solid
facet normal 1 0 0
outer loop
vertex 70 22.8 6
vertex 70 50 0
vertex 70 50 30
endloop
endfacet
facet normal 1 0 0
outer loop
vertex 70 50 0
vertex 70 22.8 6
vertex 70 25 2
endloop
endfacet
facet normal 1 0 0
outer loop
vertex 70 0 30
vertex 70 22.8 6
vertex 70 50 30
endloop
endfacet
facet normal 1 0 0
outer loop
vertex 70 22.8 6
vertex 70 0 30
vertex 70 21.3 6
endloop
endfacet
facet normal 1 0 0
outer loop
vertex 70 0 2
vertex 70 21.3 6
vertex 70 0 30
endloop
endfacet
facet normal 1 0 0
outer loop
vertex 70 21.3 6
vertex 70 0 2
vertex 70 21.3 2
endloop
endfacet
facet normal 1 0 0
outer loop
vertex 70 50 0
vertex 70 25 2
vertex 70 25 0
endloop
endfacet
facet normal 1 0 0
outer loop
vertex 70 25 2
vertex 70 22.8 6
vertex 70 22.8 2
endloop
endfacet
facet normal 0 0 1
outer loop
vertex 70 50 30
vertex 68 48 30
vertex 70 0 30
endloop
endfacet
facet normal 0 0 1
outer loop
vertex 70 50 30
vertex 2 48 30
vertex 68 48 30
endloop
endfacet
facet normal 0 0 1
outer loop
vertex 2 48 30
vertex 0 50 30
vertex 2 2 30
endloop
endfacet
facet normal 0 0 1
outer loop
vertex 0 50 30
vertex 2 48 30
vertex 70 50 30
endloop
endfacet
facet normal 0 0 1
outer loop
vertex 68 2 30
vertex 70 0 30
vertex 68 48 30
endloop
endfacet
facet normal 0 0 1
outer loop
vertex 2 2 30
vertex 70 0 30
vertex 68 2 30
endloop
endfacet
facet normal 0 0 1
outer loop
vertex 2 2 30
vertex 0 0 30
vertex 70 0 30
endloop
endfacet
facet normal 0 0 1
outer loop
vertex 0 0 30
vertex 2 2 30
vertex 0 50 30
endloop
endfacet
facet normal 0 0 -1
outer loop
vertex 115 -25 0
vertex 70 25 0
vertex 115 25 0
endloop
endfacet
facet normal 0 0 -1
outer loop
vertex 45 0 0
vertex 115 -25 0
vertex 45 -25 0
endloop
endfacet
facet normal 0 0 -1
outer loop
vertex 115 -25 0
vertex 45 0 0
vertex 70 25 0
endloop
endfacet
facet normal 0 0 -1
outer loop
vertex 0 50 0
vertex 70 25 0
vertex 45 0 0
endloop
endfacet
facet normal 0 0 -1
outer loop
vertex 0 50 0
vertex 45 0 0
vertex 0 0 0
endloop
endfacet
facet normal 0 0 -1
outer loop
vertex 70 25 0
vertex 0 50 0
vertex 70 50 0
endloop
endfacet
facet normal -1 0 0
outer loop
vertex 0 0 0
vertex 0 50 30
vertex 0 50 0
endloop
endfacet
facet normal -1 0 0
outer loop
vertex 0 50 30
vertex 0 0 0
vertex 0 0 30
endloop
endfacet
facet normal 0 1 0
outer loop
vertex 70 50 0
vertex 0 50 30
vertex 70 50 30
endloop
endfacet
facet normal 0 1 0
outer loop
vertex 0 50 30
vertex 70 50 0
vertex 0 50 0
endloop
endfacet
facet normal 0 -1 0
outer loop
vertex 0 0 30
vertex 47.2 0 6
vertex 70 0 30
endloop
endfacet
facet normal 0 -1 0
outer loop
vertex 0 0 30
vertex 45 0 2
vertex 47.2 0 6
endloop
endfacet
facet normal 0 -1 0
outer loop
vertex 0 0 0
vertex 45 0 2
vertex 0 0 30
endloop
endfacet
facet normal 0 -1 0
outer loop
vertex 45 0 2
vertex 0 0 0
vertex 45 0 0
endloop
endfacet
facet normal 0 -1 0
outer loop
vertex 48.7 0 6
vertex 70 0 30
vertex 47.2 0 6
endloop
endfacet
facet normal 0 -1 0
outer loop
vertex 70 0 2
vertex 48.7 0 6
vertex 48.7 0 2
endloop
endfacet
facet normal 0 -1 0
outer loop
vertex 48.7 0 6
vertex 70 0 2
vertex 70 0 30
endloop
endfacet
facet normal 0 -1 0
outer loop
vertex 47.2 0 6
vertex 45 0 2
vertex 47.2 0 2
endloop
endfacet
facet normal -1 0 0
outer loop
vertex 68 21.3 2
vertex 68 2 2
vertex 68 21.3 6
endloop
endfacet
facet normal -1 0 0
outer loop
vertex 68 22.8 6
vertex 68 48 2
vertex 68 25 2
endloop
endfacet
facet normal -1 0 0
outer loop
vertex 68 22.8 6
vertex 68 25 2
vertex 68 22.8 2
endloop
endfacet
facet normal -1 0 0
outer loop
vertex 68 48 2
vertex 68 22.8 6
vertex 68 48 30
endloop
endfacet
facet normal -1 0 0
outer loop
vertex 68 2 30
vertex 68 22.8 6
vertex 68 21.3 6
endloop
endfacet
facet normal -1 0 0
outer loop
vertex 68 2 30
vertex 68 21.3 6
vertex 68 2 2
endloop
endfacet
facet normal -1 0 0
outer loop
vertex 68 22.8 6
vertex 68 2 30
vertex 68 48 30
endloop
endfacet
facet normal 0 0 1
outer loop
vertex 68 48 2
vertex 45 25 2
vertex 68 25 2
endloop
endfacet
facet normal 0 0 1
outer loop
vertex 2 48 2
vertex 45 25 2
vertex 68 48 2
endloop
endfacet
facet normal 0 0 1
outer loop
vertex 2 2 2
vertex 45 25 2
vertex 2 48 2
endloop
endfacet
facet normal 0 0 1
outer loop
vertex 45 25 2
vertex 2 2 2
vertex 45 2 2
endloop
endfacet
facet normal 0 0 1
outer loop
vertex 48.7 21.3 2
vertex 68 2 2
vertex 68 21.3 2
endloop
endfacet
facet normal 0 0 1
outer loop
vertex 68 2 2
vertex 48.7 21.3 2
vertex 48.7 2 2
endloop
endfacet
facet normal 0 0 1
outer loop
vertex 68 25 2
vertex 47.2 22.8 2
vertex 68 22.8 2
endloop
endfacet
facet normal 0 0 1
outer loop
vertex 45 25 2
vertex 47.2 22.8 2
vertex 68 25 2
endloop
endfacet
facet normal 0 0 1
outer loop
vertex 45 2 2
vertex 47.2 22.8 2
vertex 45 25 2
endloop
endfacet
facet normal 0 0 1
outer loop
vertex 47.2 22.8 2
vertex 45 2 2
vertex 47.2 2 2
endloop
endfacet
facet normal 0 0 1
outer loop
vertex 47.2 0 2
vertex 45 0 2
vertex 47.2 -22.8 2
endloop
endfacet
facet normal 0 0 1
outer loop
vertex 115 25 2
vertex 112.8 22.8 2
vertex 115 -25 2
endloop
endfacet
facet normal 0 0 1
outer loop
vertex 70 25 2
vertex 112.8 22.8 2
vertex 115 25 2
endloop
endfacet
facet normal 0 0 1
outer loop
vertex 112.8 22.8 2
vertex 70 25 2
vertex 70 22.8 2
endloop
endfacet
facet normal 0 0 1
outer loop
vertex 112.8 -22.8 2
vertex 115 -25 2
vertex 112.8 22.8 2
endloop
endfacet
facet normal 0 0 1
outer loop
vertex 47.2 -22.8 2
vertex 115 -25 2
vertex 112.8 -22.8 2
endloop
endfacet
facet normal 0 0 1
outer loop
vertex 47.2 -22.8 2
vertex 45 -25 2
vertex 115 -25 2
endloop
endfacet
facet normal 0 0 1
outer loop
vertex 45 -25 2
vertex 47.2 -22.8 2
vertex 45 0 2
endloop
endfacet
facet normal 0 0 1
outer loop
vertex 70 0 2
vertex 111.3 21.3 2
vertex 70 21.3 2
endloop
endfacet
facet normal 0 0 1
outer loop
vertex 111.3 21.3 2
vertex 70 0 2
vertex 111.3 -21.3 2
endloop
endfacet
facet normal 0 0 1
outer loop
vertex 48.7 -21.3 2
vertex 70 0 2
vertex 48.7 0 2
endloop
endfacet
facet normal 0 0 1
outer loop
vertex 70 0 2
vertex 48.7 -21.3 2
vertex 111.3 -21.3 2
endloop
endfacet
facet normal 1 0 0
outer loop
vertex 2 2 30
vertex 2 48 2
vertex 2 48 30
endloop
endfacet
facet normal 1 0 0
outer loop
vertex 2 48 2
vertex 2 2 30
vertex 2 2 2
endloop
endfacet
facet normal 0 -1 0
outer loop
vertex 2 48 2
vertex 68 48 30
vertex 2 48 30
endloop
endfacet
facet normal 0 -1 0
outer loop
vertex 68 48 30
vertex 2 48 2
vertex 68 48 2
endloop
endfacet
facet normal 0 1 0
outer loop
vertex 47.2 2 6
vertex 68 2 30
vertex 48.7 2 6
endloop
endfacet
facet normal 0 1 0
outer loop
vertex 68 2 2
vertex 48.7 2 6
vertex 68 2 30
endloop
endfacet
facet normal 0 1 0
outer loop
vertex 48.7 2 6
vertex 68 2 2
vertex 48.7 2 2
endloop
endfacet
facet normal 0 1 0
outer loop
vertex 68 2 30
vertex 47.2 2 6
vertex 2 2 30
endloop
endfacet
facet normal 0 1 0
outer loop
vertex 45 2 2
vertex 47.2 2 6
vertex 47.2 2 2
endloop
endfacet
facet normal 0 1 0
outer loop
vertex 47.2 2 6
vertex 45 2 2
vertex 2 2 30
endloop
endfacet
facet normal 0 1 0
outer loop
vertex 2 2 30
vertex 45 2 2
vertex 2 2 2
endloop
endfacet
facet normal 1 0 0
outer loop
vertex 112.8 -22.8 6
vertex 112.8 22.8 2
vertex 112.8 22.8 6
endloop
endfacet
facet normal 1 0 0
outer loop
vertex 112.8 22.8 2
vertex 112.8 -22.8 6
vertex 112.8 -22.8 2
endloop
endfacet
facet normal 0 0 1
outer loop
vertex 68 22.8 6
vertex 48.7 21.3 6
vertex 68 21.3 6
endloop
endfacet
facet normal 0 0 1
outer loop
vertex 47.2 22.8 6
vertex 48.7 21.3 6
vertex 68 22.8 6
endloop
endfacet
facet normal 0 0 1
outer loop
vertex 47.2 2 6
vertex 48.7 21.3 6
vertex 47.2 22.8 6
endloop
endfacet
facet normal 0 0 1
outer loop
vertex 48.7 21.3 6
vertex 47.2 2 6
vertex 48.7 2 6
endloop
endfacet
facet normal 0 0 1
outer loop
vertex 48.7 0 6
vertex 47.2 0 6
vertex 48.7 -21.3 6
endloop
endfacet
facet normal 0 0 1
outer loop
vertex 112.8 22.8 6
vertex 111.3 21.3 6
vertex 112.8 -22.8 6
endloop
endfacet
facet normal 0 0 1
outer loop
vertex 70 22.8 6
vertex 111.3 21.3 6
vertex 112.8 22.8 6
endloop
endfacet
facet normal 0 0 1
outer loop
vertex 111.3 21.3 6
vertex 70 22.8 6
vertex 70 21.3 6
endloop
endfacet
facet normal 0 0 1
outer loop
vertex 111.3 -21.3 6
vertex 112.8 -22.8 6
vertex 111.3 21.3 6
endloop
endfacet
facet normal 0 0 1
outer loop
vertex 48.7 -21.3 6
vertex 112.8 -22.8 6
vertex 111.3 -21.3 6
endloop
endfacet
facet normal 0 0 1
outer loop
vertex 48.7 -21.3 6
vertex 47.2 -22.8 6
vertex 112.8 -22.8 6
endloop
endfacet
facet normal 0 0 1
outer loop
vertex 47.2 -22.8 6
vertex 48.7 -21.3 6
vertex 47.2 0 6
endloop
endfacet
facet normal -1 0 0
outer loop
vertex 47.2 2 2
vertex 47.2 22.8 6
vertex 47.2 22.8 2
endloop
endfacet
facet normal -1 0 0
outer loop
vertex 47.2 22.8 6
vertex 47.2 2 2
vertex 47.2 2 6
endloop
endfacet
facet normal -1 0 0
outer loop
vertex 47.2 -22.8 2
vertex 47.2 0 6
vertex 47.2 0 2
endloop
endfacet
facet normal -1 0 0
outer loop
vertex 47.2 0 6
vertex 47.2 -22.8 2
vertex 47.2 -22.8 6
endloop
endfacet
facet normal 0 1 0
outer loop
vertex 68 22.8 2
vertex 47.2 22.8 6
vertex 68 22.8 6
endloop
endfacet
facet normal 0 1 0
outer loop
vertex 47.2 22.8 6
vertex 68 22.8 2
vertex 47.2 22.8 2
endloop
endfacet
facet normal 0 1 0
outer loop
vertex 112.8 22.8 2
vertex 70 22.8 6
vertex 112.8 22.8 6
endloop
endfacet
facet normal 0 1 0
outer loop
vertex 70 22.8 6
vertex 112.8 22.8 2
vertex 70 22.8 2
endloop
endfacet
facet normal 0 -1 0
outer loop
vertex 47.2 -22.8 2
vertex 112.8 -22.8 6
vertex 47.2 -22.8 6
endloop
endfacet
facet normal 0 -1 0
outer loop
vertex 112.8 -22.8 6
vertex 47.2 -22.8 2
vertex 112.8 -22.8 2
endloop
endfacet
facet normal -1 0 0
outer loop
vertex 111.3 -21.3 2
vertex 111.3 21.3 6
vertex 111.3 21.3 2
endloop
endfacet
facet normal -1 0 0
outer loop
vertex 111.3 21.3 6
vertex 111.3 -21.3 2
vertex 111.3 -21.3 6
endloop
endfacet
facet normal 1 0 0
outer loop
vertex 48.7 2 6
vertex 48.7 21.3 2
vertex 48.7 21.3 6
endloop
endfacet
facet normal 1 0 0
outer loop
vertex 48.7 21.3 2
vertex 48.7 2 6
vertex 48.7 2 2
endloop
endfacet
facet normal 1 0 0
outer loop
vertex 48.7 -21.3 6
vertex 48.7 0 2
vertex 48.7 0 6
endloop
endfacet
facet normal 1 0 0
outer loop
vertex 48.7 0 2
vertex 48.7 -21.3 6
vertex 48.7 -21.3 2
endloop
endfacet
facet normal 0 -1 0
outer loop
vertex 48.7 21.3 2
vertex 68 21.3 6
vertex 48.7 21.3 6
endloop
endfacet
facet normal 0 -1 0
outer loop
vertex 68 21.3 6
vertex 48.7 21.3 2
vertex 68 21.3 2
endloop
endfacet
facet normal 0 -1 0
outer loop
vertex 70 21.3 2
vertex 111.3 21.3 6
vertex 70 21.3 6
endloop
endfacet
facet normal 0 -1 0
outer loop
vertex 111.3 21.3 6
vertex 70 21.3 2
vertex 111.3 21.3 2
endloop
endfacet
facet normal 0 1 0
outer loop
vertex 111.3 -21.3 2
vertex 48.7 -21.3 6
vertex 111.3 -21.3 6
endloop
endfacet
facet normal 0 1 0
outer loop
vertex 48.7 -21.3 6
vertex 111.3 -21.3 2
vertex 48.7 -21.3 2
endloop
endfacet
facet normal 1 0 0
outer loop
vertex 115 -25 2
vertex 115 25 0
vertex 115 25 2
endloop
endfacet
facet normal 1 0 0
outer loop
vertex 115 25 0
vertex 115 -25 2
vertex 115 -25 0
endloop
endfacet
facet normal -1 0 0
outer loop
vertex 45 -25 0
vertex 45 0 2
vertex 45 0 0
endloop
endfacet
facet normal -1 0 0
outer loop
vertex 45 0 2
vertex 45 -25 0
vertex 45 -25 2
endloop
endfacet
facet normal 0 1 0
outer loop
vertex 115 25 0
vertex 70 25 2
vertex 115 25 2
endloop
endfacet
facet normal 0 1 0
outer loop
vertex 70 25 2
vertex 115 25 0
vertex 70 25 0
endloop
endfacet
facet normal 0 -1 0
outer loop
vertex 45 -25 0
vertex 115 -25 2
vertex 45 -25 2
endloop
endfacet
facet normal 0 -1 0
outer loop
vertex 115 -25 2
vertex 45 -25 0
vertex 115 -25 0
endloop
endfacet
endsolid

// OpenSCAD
// Dimensions
// Box outer dimensions
BOX_W = 70;
BOX_D = 50;
BOX_H = 30;

// Box wall and floor thickness
BOX_WALL = 2;
BOX_FLOOR = 2;

// Lid plate dimensions
LID_W = 70;
LID_D = 50;
LID_THICK = 2;

// Lid lip dimensions
LIP_THICK = 1.5;
LIP_H = 4;
LIP_W = 65.6;
LIP_D = 45.6;

// Gap between parts on the print bed
PART_GAP = 10;

// Calculated Inner Dimensions for Box
// Inner width/depth is outer minus 2*wall
BOX_INNER_W = BOX_W - 2 * BOX_WALL;
BOX_INNER_D = BOX_D - 2 * BOX_WALL;
// Inner height is outer minus floor (since top is open)
BOX_INNER_H = BOX_H - BOX_FLOOR;

// Calculated Inner Dimensions for Lip
// Inner width/depth is outer minus 2*wall thickness
LIP_INNER_W = LIP_W - 2 * LIP_THICK;
LIP_INNER_D = LIP_D - 2 * LIP_THICK;

// Positioning
// Box is centered at X=0, Y=0.
// Lid is placed on the +X side with a 10 mm gap.
// Box extends from X = -35 to 35.
// Lid starts at X = 35 + 10 = 45.
// Lid width is 70, so it extends from 45 to 115.
// Center of lid in X: 45 + 35 = 80.
// Both are centered in Y.

// --- Part 1: The Box ---
// Built in print orientation: rests on XY plane, builds upward +Z.
// Open top.
module Box() {
    // We build the box as a solid block and subtract the inner volume.
    // This ensures the floor and walls are solid.
    
    // Outer shell
    difference() {
        // Solid block
        cube([BOX_W, BOX_D, BOX_H], center = false);
        
        // Inner cavity (subtractive)
        // The cavity starts at z = BOX_FLOOR (thickness of floor)
        // It goes up to BOX_H (open top)
        // It is inset by BOX_WALL from the sides.
        translate([BOX_WALL, BOX_WALL, BOX_FLOOR]) {
            // Extend slightly past the top to ensure clean cut if needed, 
            // though open top means we just cut down to the floor level.
            // To avoid coplanar faces, we extend the cut slightly into the floor or up.
            // Let's extend the cut slightly below the floor level to ensure the bottom face is clean.
            // Actually, standard practice: cut volume is slightly larger than the void.
            // Void: X: [BOX_WALL, BOX_W-BOX_WALL], Y: [BOX_WALL, BOX_D-BOX_WALL], Z: [BOX_FLOOR, BOX_H]
            // Let's make the cut slightly deeper into the floor to avoid Z-fighting or coplanar issues.
            // Cut Z range: [BOX_FLOOR - 0.01, BOX_H + 0.01]
            cube([BOX_INNER_W, BOX_INNER_D, BOX_INNER_H + 0.01], center = false);
        }
    }
}

// --- Part 2: The Lid ---
// Printed upside down.
// The user says: "a plate 70 x 50 x 2 mm lying on the bed, with a rectangular lip on top of it".
// "Printed upside down" usually means the final part is inverted relative to the print orientation.
// However, the description "plate ... lying on the bed, with a lip on top of it" describes the geometry in the print orientation.
// If the lid is printed "upside down", it typically means the "top" of the lid (the side that faces up when closed) is the bottom of the print.
// But the description explicitly says: "a plate ... lying on the bed ... with a lip on top of it".
// This implies the geometry is: Plate on bed, Lip sticking up.
// When you flip this over to use it, the Plate becomes the top surface, and the Lip hangs down into the box.
// This matches the requirement: "slides into the box opening".
// So we model it exactly as described: Plate on Z=0, Lip extending +Z.

module Lid() {
    union() {
        // Plate
        // Centered in X, Y.
        // X: -35 to 35, Y: -25 to 25.
        translate([-LID_W/2, -LID_D/2, 0]) {
            cube([LID_W, LID_D, LID_THICK], center = false);
        }
        
        // Lip
        // Outer size 65.6 x 45.6, centered on the plate.
        // Height 4 mm.
        // Thickness 1.5 mm.
        // The lip is a hollow box? "1.5 mm thick wall".
        // Yes, it's a wall.
        
        // Lip outer dimensions
        lip_outer_w = LIP_W;
        lip_outer_d = LIP_D;
        lip_inner_w = lip_outer_w - 2 * LIP_THICK;
        lip_inner_d = lip_outer_d - 2 * LIP_THICK;
        
        // Lip position: Centered on the plate.
        // Plate is from -35 to 35 in X.
        // Lip is from -32.8 to 32.8 in X (65.6 width).
        // Lip is from -22.8 to 22.8 in Y (45.6 depth).
        
        // We build the lip as a solid block and subtract the inner void.
        // The lip sits on top of the plate.
        // Plate top is at Z = LID_THICK = 2.
        // Lip bottom is at Z = 2.
        // Lip top is at Z = 2 + LIP_H = 6.
        
        translate([-lip_outer_w/2, -lip_outer_d/2, LID_THICK]) {
            difference() {
                // Outer lip block
                cube([lip_outer_w, lip_outer_d, LIP_H], center = false);
                
                // Inner void
                // Extend slightly to ensure clean cut
                translate([LIP_THICK, LIP_THICK, -0.01]) {
                    cube([lip_inner_w, lip_inner_d, LIP_H + 0.01], center = false);
                }
            }
        }
    }
}

// --- Main Assembly ---
// Place parts side by side.
// Box at X=0.
// Lid at X=80 (center).

$fn = 64;

// Box
translate([0, 0, 0]) {
    Box();
}

// Lid
// Center of lid is at X=80, Y=0.
translate([80, 0, 0]) {
    Lid();
}
